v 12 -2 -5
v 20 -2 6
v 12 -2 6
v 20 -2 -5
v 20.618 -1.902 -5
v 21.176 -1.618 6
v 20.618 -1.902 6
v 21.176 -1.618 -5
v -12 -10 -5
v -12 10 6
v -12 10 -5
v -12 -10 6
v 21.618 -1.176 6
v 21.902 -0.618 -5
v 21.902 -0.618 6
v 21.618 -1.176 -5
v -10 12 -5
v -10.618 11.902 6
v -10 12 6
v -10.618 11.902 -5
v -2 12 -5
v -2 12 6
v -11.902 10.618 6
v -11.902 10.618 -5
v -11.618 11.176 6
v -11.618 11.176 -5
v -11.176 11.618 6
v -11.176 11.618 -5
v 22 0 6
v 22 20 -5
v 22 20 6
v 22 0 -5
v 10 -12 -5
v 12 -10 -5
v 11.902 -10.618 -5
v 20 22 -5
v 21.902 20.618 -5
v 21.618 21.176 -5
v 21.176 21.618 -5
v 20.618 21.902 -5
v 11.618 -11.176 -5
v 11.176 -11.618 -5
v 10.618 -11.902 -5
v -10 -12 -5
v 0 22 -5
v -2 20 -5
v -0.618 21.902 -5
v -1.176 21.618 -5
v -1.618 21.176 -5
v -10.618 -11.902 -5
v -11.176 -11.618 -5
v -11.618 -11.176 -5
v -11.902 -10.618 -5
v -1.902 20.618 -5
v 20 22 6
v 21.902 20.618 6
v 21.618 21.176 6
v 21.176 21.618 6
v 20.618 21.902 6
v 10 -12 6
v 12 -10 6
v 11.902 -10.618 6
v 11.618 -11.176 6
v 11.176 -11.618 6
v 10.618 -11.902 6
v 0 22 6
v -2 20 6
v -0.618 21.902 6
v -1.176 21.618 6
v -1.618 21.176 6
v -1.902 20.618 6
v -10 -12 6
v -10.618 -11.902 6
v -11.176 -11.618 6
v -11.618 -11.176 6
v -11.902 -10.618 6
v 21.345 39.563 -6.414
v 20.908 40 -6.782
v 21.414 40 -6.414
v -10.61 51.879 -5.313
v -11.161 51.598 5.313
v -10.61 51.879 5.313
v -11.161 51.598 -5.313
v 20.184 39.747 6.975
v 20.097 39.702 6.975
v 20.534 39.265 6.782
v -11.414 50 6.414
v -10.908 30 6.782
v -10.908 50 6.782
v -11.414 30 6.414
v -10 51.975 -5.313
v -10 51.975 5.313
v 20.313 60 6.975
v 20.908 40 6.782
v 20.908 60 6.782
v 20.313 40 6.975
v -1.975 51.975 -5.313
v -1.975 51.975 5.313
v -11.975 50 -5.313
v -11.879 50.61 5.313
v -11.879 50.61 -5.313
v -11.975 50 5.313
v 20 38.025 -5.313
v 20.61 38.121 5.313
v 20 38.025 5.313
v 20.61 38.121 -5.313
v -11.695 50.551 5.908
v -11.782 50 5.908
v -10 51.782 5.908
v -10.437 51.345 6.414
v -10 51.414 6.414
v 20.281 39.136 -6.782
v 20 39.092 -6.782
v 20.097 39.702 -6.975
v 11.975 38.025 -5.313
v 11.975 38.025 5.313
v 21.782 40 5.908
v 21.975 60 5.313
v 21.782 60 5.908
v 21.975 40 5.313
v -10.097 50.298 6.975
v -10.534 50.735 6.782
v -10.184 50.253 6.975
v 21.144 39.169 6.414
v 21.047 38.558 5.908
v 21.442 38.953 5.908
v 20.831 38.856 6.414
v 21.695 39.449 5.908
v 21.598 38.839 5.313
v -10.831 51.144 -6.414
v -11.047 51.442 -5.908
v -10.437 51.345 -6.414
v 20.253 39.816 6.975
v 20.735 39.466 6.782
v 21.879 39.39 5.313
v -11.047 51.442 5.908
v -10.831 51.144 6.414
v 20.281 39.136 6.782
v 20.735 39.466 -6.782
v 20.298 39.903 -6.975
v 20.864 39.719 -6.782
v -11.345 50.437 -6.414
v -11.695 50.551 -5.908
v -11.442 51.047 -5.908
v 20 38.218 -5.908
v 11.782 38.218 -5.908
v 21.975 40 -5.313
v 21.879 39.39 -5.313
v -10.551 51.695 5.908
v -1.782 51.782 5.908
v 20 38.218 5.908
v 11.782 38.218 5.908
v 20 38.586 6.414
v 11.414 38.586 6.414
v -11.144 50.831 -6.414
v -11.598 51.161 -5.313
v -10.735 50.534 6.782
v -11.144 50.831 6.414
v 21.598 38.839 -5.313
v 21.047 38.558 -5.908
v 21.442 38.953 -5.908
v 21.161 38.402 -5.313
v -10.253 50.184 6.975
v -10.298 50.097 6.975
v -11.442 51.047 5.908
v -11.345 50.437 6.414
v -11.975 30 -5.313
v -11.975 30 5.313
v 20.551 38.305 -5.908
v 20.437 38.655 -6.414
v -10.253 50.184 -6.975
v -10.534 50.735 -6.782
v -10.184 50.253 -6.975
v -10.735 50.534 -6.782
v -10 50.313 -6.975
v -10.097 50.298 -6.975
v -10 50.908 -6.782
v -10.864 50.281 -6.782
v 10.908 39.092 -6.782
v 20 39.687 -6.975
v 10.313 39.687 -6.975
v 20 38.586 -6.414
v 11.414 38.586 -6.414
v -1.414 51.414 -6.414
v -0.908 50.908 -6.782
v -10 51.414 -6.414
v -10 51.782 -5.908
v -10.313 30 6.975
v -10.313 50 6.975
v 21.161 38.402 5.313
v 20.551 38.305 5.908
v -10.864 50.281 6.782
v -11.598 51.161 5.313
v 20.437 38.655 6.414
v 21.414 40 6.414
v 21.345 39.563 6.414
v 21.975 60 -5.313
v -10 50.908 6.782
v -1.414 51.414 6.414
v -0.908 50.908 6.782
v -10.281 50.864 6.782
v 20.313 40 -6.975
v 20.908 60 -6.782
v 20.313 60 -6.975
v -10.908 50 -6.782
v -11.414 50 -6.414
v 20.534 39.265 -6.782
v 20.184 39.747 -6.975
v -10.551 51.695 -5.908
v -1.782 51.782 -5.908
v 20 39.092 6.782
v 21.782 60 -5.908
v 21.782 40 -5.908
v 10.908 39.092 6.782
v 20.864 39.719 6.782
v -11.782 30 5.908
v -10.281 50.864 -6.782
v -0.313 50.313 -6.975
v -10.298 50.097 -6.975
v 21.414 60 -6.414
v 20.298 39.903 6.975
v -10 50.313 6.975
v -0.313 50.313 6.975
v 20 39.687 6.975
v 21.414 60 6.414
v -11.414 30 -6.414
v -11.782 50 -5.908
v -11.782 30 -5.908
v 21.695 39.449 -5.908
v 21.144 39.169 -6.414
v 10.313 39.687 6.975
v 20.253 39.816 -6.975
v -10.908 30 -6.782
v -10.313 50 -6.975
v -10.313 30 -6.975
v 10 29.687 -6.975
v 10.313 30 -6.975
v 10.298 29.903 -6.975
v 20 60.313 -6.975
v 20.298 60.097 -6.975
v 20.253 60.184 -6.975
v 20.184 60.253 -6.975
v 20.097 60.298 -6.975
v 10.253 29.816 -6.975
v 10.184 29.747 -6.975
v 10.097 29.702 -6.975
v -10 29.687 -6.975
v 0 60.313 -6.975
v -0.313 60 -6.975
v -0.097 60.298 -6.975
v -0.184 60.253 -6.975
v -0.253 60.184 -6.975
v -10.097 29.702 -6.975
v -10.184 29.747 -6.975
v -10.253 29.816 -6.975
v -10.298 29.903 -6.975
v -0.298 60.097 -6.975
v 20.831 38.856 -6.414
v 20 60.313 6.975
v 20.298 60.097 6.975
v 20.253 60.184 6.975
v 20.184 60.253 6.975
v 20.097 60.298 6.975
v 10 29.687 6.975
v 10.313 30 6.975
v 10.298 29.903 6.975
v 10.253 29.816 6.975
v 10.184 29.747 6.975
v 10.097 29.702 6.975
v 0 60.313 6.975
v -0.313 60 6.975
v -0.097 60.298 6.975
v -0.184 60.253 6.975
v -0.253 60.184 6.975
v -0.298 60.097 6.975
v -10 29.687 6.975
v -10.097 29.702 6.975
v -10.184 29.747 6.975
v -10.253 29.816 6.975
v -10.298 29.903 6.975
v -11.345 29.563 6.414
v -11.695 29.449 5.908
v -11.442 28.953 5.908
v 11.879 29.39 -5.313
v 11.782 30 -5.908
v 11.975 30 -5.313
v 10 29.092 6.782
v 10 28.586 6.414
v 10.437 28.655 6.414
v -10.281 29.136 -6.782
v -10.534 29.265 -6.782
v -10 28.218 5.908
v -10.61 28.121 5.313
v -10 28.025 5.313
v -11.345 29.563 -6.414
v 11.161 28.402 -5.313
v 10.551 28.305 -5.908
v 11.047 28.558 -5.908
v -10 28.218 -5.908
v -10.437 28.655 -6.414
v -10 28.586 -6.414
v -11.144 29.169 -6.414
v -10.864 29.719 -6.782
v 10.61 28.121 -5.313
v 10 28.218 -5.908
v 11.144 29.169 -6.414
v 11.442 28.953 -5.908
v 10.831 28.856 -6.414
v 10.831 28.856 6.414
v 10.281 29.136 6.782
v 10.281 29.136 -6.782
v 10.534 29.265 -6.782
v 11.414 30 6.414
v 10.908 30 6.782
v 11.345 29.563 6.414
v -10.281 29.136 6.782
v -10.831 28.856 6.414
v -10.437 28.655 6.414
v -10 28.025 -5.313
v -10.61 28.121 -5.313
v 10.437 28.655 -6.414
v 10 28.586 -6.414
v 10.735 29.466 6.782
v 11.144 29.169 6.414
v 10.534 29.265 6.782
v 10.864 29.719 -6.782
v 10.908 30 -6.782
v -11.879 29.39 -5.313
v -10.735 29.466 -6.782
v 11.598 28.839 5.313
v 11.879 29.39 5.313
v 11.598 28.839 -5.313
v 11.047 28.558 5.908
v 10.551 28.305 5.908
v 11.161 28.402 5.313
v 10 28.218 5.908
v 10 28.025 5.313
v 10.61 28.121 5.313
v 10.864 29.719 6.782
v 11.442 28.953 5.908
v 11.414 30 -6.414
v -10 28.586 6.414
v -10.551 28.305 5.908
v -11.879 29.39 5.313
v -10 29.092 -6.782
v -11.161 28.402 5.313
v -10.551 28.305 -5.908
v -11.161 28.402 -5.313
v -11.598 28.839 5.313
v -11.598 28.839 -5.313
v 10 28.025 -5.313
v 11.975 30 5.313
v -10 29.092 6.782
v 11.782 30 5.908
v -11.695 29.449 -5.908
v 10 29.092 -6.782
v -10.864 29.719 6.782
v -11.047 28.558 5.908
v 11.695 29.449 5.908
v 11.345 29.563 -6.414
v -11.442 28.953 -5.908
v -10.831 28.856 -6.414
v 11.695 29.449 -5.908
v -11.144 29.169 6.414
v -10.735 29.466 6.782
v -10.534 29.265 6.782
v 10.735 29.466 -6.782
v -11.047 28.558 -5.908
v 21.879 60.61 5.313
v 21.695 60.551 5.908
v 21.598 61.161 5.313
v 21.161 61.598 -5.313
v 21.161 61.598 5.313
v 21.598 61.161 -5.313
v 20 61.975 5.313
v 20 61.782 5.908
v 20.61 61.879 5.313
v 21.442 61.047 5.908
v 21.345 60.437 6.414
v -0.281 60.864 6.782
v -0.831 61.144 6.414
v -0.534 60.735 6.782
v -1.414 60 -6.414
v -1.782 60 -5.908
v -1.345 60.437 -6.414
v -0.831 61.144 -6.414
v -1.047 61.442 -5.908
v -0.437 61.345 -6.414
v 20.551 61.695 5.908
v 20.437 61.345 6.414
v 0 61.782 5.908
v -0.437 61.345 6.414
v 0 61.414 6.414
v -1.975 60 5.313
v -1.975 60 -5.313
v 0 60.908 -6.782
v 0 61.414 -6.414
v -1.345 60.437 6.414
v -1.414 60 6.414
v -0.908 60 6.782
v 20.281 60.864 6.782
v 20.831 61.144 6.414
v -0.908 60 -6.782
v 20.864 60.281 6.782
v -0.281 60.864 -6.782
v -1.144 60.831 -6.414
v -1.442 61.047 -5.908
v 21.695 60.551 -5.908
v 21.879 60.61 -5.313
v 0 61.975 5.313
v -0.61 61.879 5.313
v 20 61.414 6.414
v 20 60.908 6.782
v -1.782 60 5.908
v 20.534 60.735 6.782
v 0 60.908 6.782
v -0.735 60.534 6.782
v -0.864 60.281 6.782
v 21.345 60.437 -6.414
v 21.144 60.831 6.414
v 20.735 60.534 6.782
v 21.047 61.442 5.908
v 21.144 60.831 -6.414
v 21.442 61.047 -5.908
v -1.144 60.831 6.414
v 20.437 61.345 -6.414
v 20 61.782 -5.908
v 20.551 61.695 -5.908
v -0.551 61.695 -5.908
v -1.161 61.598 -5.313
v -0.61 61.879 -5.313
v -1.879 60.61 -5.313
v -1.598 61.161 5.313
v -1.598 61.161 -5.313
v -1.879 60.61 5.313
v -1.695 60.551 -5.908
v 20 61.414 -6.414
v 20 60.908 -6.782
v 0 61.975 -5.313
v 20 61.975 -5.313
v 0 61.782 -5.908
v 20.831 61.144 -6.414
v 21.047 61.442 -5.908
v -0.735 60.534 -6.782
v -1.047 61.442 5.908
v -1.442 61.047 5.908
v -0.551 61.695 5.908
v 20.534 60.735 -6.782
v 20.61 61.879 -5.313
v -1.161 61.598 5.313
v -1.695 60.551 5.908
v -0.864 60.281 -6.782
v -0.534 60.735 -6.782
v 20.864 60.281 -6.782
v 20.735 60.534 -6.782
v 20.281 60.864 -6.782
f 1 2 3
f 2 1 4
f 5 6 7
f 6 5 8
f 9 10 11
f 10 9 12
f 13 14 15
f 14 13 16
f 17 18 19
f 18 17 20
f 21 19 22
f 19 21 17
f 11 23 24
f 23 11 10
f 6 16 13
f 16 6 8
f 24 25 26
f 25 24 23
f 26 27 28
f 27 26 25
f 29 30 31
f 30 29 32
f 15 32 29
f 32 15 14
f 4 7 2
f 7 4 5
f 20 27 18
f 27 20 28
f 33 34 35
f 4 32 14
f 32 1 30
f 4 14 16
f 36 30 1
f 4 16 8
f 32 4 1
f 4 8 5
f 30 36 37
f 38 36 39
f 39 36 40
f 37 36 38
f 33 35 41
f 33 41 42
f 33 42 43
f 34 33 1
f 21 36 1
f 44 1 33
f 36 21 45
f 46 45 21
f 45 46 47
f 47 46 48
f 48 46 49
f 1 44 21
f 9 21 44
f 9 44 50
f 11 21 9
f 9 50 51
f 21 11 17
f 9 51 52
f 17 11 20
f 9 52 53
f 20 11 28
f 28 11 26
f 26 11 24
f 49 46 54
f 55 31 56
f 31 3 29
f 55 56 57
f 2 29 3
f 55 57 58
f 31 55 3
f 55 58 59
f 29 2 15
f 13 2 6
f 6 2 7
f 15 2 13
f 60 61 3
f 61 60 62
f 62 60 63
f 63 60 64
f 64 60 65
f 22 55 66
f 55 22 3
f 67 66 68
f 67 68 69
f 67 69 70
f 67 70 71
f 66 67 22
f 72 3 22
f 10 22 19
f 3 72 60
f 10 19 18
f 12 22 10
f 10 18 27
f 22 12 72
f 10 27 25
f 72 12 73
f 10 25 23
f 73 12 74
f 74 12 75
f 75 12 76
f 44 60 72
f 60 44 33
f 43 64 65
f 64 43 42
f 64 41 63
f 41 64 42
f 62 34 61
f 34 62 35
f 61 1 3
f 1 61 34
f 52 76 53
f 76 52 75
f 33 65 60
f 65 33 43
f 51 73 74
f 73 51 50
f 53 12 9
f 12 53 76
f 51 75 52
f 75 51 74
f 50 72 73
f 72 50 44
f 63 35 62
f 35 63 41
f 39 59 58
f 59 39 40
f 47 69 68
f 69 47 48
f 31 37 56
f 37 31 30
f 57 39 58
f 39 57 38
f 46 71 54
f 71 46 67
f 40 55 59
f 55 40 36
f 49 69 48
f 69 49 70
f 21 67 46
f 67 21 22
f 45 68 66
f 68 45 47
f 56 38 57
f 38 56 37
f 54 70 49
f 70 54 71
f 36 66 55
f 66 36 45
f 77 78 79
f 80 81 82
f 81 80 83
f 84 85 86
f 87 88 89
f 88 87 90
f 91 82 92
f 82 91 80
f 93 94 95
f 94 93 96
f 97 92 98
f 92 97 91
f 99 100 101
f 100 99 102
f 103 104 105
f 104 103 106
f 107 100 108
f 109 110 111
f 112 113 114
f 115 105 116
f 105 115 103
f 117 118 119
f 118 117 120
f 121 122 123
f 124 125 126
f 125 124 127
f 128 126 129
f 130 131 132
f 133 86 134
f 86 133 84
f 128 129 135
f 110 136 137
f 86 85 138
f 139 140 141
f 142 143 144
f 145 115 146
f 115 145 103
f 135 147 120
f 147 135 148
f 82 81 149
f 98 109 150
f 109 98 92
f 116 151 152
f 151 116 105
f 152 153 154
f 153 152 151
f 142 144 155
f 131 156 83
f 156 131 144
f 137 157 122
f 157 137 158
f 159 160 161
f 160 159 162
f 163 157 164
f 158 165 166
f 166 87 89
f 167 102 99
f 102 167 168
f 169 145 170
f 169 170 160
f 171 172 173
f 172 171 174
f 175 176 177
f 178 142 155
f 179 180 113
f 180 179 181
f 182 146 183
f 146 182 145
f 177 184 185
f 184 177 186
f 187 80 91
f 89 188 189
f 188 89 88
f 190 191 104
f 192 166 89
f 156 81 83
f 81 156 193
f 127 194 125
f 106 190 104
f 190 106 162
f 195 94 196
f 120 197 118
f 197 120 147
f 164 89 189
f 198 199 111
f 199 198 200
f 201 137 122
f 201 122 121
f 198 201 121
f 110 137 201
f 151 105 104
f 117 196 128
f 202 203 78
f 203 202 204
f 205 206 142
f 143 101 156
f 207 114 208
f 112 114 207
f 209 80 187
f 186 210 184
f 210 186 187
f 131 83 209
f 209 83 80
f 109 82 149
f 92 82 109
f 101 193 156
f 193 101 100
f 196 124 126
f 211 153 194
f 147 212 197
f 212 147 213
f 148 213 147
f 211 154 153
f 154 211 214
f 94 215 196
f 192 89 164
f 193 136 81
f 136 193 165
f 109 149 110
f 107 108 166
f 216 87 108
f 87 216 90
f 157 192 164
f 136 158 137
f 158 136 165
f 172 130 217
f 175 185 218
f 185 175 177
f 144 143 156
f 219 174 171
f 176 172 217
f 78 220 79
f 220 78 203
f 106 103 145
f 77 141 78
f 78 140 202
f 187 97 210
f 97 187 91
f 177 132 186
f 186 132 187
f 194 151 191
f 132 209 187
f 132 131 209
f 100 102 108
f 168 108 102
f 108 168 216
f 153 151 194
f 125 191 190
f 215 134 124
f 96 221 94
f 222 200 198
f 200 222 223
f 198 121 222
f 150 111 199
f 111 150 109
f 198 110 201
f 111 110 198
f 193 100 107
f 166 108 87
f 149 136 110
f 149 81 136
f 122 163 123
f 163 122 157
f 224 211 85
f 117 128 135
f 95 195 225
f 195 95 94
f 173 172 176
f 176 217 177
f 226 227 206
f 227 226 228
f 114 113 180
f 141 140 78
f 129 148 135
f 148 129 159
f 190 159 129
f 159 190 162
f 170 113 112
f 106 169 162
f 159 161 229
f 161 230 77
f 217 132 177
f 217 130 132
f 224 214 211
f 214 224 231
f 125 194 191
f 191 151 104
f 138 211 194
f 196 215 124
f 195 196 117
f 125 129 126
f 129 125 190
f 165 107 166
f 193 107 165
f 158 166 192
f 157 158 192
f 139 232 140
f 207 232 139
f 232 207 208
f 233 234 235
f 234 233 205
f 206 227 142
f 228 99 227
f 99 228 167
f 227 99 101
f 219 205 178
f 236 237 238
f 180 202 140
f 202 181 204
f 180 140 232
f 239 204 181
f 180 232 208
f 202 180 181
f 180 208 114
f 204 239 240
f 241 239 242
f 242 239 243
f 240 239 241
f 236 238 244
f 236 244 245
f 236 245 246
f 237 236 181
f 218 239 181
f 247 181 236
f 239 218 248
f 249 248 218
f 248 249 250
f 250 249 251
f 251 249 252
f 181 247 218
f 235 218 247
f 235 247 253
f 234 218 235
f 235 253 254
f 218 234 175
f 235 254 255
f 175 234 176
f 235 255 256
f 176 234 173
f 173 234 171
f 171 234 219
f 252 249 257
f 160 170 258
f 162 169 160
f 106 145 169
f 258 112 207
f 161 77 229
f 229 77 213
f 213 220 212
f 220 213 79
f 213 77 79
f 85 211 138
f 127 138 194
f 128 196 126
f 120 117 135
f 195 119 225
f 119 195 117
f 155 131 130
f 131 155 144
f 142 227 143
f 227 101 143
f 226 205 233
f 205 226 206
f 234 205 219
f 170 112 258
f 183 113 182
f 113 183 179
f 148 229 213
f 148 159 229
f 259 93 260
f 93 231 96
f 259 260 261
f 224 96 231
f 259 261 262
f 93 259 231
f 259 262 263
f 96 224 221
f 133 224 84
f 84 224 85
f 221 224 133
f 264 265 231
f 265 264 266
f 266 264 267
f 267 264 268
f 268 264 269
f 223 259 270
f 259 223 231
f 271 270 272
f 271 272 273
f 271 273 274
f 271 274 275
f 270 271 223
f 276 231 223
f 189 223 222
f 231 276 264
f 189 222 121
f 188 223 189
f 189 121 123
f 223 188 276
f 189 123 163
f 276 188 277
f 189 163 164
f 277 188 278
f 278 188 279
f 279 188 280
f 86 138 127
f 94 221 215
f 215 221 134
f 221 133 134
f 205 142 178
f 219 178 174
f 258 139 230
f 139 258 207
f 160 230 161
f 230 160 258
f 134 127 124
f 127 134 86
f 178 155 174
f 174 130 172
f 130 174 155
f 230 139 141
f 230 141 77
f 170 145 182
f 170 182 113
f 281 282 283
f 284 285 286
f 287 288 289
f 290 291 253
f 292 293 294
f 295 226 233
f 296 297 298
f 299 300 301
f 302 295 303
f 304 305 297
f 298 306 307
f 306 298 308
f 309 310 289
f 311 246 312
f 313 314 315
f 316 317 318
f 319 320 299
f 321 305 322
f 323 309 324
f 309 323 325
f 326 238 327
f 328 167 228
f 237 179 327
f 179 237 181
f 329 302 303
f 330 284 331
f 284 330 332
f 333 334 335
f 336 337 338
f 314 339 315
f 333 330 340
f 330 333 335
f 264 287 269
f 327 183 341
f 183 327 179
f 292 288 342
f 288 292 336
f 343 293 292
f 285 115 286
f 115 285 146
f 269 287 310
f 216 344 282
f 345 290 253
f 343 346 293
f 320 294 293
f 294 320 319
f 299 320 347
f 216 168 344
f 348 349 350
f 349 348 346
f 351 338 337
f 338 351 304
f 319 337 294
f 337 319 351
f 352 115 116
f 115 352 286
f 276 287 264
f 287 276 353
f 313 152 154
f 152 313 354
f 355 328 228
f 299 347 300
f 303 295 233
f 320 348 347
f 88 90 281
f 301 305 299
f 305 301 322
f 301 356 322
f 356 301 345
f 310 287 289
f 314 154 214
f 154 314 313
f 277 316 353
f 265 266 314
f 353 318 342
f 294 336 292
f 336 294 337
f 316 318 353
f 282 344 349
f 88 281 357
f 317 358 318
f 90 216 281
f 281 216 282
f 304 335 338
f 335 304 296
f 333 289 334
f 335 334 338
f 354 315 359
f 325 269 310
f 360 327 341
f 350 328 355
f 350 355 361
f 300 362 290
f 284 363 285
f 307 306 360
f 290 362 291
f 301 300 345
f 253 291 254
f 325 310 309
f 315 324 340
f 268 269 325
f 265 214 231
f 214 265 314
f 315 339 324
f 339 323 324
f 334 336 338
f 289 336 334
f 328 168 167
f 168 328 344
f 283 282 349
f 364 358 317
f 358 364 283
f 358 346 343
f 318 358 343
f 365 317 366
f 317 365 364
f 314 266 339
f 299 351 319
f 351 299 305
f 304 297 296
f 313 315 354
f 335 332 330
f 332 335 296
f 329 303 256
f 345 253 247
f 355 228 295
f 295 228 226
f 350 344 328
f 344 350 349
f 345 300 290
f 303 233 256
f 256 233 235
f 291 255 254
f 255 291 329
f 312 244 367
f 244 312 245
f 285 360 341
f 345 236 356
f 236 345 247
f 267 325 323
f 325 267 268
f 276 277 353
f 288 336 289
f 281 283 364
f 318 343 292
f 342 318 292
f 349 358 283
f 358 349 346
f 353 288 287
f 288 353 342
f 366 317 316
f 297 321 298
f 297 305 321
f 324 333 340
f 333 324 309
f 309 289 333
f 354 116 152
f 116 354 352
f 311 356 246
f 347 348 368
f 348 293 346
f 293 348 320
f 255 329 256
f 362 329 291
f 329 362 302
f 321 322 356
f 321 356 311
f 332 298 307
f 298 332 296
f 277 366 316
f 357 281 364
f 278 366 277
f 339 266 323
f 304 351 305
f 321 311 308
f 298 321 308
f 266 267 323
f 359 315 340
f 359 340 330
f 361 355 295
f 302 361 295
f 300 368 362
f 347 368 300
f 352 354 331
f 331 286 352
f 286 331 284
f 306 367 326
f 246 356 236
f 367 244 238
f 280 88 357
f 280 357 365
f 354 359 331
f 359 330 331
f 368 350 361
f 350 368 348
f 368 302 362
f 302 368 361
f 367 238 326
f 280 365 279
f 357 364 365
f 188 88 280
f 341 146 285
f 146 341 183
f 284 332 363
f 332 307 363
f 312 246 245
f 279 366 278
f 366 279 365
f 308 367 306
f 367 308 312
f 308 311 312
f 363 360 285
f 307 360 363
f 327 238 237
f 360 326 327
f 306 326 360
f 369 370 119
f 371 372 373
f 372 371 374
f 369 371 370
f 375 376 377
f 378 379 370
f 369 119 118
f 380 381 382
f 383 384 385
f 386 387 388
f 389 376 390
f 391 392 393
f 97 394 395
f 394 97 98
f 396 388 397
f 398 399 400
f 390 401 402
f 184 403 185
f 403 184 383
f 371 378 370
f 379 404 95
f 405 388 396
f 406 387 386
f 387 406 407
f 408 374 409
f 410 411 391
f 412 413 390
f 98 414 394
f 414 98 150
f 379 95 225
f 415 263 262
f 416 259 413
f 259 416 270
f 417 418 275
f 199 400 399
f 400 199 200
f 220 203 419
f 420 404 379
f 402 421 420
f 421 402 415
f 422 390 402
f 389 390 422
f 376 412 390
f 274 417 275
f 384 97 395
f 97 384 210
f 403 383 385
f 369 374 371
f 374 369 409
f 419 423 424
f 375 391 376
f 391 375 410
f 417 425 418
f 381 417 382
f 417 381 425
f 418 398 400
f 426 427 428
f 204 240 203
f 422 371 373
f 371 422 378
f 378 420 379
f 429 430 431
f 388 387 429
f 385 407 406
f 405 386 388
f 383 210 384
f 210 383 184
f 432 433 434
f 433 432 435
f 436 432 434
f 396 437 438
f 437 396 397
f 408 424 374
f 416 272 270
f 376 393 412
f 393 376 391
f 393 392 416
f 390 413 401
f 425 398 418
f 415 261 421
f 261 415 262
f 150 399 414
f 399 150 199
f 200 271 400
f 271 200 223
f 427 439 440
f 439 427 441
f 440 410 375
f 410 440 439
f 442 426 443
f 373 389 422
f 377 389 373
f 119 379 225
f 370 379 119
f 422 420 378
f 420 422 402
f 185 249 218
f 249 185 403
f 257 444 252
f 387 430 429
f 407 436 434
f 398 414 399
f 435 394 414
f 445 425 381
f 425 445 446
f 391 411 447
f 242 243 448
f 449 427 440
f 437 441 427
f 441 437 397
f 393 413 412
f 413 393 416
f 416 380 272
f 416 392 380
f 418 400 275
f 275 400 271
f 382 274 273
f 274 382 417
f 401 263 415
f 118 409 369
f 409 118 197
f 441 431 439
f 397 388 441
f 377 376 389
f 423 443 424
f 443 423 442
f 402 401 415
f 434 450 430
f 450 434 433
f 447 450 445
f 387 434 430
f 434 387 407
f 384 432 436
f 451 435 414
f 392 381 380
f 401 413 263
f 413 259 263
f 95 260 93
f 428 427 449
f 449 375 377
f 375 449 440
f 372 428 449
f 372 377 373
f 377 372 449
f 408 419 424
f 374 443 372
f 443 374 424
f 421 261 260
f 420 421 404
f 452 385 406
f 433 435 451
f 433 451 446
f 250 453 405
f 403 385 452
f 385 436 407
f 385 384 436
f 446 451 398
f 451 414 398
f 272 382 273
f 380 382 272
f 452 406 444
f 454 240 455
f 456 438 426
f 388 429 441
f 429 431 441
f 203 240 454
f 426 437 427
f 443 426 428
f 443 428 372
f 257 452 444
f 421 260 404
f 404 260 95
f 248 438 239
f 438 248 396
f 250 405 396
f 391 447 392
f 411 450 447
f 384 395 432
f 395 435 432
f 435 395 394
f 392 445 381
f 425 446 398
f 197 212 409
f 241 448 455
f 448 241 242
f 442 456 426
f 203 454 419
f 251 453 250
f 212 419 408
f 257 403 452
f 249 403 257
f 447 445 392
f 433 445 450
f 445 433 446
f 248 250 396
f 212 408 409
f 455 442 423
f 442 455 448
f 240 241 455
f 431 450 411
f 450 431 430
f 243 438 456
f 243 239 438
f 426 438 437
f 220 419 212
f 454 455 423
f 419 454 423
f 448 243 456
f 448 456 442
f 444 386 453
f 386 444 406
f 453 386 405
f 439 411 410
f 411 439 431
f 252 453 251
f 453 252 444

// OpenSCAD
size = [20,20,10];
radio = 2;

module pieza(){
	cube(size,center = true);

	translate([10,10,0])
		cube(size,center = true);

}

minkowski(){
	pieza();
	cylinder(r=radio,$fn=20);
}


translate([0,40,0])
	color("red")
		minkowski(){
			pieza();
			sphere(r=radio,$fn=20);
		}
